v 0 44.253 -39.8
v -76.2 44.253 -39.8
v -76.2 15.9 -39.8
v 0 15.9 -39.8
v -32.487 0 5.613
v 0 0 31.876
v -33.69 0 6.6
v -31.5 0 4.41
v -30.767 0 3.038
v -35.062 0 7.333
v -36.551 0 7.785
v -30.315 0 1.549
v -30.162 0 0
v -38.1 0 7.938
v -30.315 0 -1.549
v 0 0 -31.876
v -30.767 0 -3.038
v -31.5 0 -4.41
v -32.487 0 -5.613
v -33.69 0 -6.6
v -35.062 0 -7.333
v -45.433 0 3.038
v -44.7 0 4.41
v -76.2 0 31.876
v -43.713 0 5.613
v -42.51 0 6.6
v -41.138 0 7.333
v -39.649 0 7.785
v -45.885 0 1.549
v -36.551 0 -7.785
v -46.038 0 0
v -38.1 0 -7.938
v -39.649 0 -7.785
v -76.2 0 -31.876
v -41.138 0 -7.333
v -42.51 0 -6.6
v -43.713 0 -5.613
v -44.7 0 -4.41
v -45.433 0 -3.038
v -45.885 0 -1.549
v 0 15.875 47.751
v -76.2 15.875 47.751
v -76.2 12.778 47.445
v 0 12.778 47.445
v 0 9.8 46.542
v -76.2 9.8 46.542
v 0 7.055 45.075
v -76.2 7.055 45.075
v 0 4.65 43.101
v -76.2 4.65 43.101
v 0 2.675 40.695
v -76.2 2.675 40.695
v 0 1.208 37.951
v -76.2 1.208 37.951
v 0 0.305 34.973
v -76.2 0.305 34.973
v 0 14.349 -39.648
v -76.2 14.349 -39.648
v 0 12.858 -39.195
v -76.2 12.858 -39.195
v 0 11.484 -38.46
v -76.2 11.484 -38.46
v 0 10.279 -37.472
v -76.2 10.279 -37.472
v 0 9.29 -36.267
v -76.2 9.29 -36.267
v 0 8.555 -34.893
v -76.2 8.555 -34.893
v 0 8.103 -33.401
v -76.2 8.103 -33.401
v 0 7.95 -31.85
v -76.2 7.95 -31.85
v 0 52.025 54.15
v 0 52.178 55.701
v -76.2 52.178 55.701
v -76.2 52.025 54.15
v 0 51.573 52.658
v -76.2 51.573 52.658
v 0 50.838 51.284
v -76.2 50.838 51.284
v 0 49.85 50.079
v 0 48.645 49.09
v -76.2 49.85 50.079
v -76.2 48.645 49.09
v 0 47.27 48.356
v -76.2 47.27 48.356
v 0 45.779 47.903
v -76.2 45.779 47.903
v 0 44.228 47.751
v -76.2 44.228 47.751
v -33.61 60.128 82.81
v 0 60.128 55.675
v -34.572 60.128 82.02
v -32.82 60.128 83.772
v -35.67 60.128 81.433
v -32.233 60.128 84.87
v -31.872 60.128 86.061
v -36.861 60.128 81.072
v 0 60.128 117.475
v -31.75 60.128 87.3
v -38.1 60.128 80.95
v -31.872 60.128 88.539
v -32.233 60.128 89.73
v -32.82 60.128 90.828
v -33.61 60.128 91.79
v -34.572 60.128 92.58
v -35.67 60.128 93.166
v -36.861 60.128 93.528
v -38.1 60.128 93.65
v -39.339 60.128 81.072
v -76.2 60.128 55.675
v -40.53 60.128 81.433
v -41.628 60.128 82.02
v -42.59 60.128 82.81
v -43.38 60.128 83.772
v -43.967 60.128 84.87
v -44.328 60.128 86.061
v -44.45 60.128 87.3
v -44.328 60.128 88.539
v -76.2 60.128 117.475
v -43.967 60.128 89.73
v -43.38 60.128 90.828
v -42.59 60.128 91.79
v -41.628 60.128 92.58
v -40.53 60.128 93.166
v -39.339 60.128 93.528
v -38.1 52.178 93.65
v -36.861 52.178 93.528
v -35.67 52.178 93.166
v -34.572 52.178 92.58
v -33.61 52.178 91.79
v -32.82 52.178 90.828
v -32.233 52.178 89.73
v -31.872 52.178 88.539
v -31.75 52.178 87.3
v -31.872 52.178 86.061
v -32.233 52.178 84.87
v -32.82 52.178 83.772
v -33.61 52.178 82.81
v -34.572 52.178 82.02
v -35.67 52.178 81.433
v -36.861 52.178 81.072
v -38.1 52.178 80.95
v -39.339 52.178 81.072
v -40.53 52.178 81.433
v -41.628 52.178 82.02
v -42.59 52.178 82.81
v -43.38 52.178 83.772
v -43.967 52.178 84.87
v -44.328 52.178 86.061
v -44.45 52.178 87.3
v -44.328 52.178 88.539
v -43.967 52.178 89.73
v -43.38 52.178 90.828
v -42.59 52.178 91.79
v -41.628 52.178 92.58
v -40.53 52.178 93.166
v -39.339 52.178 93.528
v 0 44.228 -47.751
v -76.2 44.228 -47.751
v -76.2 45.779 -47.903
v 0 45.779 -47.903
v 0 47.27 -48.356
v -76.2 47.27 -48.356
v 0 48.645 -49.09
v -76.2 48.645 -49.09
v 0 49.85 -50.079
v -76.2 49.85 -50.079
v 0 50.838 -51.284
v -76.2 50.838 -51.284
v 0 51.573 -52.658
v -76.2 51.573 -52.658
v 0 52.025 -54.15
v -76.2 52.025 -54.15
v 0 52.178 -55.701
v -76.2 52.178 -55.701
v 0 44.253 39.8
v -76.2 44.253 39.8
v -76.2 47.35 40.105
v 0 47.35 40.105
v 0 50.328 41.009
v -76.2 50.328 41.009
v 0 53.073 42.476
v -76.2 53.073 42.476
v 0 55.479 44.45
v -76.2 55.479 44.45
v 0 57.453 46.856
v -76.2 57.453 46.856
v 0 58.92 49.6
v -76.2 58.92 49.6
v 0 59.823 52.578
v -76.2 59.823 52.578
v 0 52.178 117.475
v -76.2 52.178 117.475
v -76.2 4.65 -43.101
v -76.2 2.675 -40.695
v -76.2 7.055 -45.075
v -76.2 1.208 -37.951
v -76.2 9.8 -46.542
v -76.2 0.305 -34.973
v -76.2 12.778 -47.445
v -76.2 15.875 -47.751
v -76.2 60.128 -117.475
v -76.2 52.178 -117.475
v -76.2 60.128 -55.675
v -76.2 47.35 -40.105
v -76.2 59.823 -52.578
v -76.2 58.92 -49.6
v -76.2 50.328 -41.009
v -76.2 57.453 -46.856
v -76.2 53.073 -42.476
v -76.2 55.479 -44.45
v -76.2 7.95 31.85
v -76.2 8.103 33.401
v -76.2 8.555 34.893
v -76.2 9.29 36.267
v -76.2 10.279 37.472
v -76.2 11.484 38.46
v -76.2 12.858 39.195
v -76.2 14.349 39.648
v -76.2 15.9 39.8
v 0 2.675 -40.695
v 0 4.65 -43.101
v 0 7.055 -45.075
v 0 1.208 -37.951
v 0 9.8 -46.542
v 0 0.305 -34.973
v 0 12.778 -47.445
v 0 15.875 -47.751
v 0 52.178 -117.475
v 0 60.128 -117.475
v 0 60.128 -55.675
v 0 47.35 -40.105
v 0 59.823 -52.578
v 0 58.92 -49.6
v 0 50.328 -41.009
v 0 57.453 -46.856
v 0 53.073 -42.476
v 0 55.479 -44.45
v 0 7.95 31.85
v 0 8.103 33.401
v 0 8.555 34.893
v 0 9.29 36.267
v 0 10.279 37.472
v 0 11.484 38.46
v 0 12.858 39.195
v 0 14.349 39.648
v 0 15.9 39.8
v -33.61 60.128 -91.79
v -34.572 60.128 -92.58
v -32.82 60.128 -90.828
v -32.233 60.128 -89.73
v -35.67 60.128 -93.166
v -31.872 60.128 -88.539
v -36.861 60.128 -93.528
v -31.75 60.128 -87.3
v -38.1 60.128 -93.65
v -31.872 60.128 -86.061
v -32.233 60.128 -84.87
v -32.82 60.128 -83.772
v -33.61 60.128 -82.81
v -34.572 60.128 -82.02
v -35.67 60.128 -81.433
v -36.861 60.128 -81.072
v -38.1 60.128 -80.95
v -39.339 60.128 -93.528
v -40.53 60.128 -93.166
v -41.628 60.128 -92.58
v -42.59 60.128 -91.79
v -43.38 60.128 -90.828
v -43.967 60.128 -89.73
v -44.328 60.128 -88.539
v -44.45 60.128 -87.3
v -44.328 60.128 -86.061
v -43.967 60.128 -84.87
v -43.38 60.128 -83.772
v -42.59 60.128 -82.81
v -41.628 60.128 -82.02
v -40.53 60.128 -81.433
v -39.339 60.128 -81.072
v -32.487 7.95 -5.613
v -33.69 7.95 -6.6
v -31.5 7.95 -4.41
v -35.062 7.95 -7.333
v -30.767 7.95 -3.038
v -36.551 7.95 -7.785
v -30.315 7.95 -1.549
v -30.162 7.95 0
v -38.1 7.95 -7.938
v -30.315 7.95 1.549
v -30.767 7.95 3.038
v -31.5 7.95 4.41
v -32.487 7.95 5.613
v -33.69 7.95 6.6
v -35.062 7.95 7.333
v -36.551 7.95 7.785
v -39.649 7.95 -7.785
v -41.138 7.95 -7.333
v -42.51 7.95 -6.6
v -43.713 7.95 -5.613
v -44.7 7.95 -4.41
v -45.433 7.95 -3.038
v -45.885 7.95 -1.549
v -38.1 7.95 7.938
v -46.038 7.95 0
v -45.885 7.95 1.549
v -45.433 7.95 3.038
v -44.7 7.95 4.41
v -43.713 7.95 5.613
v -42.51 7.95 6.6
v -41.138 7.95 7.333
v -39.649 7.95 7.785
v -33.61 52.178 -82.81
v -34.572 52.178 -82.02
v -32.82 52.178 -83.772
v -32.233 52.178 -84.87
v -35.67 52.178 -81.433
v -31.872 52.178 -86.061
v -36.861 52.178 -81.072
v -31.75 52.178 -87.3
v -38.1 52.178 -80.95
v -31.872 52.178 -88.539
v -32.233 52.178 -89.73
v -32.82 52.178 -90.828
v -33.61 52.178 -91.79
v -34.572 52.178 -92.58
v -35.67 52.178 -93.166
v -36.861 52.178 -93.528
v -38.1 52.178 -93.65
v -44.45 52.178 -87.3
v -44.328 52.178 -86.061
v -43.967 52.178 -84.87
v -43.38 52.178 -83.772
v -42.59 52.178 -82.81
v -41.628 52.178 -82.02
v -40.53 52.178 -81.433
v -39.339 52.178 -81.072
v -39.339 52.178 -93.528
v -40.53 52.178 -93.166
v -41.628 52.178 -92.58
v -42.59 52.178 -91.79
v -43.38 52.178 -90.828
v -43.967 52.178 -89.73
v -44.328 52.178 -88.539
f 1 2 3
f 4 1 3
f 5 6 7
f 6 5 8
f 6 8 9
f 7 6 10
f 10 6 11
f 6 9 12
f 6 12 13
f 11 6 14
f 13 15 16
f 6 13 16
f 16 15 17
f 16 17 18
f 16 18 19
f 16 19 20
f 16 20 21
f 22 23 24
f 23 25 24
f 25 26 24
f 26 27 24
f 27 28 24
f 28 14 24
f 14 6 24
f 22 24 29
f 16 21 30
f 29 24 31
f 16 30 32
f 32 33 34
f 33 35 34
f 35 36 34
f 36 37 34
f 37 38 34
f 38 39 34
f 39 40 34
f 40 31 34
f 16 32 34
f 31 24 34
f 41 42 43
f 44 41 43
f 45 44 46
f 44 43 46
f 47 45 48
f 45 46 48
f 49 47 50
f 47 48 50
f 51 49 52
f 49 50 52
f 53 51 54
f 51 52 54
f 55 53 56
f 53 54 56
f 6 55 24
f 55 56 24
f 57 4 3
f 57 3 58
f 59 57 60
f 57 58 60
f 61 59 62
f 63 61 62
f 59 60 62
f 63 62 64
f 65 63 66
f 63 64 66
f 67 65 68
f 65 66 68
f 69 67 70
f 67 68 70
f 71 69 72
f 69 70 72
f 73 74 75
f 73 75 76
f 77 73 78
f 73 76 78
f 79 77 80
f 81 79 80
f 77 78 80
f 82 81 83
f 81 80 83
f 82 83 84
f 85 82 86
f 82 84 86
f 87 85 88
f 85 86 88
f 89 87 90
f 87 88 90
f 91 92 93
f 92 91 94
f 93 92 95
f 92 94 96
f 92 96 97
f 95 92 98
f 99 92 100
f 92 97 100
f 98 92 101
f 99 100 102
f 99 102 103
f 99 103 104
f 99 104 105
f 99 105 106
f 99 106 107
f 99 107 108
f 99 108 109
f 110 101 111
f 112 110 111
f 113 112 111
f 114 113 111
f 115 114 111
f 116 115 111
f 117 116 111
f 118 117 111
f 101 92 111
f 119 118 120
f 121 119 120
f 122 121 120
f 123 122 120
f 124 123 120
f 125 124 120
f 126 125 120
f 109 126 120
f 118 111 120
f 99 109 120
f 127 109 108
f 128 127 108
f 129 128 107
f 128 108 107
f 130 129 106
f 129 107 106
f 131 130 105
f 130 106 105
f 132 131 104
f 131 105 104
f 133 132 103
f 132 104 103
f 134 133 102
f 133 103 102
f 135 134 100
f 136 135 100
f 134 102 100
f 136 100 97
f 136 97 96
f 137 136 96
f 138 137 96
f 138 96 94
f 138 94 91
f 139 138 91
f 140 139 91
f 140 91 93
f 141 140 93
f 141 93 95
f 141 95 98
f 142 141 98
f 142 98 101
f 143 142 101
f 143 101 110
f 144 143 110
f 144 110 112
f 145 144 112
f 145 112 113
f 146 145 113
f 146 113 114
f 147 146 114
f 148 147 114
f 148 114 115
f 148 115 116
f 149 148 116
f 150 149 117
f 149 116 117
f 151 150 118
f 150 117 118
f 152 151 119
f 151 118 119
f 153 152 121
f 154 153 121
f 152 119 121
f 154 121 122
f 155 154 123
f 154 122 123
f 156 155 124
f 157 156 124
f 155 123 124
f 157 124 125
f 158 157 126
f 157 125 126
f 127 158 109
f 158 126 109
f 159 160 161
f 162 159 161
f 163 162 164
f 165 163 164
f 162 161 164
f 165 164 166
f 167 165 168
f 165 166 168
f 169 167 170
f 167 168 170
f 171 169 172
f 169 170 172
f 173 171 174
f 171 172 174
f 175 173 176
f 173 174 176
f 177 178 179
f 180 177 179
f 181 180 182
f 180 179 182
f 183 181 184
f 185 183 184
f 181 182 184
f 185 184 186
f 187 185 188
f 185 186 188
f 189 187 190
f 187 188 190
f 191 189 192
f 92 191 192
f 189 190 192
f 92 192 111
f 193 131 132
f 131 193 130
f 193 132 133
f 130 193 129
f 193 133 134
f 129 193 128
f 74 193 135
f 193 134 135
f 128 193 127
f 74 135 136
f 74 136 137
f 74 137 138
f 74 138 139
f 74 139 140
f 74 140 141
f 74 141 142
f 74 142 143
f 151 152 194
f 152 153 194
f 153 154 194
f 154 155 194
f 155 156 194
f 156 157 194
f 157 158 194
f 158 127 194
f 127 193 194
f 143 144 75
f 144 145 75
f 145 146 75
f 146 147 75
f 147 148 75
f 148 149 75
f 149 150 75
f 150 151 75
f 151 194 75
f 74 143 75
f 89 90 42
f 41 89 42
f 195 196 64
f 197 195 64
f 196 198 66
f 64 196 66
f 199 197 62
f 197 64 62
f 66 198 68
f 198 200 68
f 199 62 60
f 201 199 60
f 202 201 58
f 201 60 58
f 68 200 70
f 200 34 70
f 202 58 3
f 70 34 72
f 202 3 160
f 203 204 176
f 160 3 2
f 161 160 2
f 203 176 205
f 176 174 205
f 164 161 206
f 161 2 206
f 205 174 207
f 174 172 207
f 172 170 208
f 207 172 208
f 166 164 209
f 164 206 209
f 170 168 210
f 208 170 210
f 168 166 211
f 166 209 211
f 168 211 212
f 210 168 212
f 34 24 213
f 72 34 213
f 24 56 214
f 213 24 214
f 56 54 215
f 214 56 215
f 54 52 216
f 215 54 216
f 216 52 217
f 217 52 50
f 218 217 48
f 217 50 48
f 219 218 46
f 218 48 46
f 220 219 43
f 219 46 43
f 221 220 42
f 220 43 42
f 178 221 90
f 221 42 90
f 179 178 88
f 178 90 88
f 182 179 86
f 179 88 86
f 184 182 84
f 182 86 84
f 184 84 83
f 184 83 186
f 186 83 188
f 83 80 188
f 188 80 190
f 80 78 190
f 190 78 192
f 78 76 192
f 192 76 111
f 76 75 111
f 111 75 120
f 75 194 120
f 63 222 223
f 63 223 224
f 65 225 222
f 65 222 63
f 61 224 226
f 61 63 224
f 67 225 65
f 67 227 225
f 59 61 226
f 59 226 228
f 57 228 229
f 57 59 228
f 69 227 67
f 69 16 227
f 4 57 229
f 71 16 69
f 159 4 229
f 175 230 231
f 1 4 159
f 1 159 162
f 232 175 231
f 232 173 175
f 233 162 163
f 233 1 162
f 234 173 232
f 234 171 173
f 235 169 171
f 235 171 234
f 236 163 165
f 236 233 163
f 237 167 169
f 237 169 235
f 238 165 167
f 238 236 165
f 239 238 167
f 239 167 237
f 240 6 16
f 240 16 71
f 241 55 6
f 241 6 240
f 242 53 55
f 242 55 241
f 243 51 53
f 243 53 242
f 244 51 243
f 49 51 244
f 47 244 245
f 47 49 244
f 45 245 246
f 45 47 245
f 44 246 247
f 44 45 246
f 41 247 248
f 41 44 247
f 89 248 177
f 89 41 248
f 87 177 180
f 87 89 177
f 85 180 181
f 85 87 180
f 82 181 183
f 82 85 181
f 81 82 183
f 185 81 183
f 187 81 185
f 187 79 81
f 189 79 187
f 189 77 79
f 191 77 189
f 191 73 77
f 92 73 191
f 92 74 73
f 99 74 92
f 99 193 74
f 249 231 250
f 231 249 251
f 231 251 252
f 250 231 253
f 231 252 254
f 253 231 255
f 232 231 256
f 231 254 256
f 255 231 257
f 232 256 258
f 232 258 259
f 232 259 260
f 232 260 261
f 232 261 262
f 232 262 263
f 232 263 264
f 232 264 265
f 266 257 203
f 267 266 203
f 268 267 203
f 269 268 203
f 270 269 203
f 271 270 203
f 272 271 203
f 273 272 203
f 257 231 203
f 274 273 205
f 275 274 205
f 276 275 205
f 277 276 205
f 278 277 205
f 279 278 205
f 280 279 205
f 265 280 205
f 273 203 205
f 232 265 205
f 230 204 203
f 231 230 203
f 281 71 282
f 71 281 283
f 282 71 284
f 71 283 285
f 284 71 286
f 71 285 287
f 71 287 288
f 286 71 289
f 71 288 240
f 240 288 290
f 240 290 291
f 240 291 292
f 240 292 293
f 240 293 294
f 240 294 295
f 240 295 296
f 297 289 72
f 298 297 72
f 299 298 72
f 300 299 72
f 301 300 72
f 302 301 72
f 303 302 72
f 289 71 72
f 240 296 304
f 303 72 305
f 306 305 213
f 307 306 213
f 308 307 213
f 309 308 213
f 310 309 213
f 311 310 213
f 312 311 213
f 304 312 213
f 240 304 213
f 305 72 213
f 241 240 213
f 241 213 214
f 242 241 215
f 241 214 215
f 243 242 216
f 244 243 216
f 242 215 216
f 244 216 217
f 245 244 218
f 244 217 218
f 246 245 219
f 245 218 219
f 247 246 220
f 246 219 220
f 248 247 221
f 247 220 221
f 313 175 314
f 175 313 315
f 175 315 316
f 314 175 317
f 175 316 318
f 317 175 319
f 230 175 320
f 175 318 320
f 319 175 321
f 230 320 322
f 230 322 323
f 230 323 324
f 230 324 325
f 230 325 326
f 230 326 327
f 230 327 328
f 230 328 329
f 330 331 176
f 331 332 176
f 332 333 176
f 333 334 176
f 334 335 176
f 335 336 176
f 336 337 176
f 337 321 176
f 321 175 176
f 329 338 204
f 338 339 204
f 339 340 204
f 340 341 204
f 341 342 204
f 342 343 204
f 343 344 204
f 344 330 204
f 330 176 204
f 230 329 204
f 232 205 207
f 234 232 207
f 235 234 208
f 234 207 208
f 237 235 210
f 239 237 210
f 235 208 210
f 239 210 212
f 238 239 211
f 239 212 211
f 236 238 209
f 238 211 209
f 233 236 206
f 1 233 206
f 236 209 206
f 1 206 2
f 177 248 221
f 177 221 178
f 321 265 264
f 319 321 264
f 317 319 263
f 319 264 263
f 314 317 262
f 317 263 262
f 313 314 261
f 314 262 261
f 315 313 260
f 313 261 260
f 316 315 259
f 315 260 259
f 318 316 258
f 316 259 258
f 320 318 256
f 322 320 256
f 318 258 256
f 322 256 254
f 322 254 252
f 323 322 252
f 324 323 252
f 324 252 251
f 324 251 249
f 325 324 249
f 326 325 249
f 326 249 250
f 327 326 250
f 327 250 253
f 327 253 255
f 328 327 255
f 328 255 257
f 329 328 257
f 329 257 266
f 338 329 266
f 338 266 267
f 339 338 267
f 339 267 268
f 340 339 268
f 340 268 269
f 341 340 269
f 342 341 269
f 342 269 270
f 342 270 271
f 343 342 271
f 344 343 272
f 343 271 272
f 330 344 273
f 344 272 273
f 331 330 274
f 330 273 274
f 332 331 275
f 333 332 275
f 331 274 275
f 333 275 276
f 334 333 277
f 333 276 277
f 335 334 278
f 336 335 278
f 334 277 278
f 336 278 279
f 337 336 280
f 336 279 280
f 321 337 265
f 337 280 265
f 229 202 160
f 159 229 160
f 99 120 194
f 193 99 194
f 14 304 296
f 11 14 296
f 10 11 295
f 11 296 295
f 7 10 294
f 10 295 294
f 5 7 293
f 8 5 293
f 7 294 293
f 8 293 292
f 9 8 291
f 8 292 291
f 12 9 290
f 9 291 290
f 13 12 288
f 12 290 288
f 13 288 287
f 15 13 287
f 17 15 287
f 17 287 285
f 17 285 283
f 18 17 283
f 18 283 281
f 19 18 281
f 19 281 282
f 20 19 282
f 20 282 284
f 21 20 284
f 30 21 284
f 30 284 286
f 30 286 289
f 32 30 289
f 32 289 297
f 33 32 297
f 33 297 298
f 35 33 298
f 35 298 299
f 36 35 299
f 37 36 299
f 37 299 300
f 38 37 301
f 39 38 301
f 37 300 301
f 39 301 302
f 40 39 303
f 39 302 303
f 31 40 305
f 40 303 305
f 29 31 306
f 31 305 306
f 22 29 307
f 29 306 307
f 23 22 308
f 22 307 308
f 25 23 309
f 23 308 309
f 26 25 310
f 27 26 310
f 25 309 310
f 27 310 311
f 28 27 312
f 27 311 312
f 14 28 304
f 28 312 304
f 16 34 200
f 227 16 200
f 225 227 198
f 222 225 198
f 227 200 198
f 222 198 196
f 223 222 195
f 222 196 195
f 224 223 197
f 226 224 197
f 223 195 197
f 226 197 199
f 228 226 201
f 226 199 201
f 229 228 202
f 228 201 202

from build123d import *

# Parameters (mm, degrees)
BOSS_EXTRUDE3_START = -76.2
BOSS_EXTRUDE3_DEPTH = 76.2
SKETCH3_R           = 7.9375
CUT_EXTRUDE1_DEPTH  = 76.2
SKETCH2_R           = 6.35
CUT_EXTRUDE3_DEPTH  = 76.2


# Read off the part's stored shape, not the designer's step: Boss-Extrude3
with BuildPart() as part:
    # Boss-Extrude3 outline → Boss-Extrude3 (new body)
    with BuildSketch(Plane.YZ.offset(BOSS_EXTRUDE3_START)):
        with BuildLine():
            Line((44.228000004, 47.750520151), (15.875, 47.750520151))
            ThreePointArc((15.875, 47.750520151), (4.649679848, 43.100840303), (0, 31.875520151))
            Line((0, 31.875520151), (0, -31.875520151))
            ThreePointArc((0, -31.875520151), (4.649679849, -43.100840302), (15.875, -47.750520151))
            Line((15.875, -47.750520151), (44.228000004, -47.750520151))
            ThreePointArc((44.228000004, -47.750520151), (49.849640336, -50.079079819), (52.178200004, -55.700720151))
            Line((52.178200004, -55.700720151), (52.178200004, -117.475))
            Line((52.178200004, -117.475), (60.128400004, -117.475))
            Line((60.128400004, -117.475), (60.128400004, -55.675320151))
            ThreePointArc((60.128400004, -55.675320151), (55.478720155, -44.45), (44.253400004, -39.800320151))
            Line((44.253400004, -39.800320151), (15.9004, -39.800320151))
            ThreePointArc((15.9004, -39.800320151), (10.278759668, -37.471760483), (7.9502, -31.850120151))
            Line((7.9502, -31.850120151), (7.9502, 31.850120151))
            ThreePointArc((7.9502, 31.850120151), (10.278759668, 37.471760483), (15.9004, 39.800320151))
            Line((15.9004, 39.800320151), (44.253400004, 39.800320151))
            ThreePointArc((44.253400004, 39.800320151), (55.478720155, 44.45), (60.128400004, 55.675320151))
            Line((60.128400004, 55.675320151), (60.128400004, 117.475))
            Line((60.128400004, 117.475), (52.178200004, 117.475))
            Line((52.178200004, 117.475), (52.178200004, 55.700720151))
            ThreePointArc((52.178200004, 55.700720151), (49.849640335, 50.079079819), (44.228000004, 47.750520151))
        make_face()
    extrude(amount=BOSS_EXTRUDE3_DEPTH)

    # Sketch3 → Cut-Extrude1 (cut)
    with BuildSketch(Plane(origin=(0, 7.9502, 0), x_dir=(1, 0, 0), z_dir=(0, 1, 0))):
        with Locations(Location((-38.1, 0, 0), (0, 0, 270))):
            Circle(SKETCH3_R)
    extrude(amount=-CUT_EXTRUDE1_DEPTH, mode=Mode.SUBTRACT)

    # Sketch2 → Cut-Extrude3 (cut)
    with BuildSketch(Plane(origin=(0, 60.128400004, 0), x_dir=(1, 0, 0), z_dir=(0, 1, 0))):
        with Locations(Location((-38.1, 87.2998, 0), (0, 0, 270))):
            Circle(SKETCH2_R)
        with Locations(Location((-38.1, -87.2998, 0), (0, 0, 270))):
            Circle(SKETCH2_R)
    extrude(amount=-CUT_EXTRUDE3_DEPTH, mode=Mode.SUBTRACT)


solid = part.part
